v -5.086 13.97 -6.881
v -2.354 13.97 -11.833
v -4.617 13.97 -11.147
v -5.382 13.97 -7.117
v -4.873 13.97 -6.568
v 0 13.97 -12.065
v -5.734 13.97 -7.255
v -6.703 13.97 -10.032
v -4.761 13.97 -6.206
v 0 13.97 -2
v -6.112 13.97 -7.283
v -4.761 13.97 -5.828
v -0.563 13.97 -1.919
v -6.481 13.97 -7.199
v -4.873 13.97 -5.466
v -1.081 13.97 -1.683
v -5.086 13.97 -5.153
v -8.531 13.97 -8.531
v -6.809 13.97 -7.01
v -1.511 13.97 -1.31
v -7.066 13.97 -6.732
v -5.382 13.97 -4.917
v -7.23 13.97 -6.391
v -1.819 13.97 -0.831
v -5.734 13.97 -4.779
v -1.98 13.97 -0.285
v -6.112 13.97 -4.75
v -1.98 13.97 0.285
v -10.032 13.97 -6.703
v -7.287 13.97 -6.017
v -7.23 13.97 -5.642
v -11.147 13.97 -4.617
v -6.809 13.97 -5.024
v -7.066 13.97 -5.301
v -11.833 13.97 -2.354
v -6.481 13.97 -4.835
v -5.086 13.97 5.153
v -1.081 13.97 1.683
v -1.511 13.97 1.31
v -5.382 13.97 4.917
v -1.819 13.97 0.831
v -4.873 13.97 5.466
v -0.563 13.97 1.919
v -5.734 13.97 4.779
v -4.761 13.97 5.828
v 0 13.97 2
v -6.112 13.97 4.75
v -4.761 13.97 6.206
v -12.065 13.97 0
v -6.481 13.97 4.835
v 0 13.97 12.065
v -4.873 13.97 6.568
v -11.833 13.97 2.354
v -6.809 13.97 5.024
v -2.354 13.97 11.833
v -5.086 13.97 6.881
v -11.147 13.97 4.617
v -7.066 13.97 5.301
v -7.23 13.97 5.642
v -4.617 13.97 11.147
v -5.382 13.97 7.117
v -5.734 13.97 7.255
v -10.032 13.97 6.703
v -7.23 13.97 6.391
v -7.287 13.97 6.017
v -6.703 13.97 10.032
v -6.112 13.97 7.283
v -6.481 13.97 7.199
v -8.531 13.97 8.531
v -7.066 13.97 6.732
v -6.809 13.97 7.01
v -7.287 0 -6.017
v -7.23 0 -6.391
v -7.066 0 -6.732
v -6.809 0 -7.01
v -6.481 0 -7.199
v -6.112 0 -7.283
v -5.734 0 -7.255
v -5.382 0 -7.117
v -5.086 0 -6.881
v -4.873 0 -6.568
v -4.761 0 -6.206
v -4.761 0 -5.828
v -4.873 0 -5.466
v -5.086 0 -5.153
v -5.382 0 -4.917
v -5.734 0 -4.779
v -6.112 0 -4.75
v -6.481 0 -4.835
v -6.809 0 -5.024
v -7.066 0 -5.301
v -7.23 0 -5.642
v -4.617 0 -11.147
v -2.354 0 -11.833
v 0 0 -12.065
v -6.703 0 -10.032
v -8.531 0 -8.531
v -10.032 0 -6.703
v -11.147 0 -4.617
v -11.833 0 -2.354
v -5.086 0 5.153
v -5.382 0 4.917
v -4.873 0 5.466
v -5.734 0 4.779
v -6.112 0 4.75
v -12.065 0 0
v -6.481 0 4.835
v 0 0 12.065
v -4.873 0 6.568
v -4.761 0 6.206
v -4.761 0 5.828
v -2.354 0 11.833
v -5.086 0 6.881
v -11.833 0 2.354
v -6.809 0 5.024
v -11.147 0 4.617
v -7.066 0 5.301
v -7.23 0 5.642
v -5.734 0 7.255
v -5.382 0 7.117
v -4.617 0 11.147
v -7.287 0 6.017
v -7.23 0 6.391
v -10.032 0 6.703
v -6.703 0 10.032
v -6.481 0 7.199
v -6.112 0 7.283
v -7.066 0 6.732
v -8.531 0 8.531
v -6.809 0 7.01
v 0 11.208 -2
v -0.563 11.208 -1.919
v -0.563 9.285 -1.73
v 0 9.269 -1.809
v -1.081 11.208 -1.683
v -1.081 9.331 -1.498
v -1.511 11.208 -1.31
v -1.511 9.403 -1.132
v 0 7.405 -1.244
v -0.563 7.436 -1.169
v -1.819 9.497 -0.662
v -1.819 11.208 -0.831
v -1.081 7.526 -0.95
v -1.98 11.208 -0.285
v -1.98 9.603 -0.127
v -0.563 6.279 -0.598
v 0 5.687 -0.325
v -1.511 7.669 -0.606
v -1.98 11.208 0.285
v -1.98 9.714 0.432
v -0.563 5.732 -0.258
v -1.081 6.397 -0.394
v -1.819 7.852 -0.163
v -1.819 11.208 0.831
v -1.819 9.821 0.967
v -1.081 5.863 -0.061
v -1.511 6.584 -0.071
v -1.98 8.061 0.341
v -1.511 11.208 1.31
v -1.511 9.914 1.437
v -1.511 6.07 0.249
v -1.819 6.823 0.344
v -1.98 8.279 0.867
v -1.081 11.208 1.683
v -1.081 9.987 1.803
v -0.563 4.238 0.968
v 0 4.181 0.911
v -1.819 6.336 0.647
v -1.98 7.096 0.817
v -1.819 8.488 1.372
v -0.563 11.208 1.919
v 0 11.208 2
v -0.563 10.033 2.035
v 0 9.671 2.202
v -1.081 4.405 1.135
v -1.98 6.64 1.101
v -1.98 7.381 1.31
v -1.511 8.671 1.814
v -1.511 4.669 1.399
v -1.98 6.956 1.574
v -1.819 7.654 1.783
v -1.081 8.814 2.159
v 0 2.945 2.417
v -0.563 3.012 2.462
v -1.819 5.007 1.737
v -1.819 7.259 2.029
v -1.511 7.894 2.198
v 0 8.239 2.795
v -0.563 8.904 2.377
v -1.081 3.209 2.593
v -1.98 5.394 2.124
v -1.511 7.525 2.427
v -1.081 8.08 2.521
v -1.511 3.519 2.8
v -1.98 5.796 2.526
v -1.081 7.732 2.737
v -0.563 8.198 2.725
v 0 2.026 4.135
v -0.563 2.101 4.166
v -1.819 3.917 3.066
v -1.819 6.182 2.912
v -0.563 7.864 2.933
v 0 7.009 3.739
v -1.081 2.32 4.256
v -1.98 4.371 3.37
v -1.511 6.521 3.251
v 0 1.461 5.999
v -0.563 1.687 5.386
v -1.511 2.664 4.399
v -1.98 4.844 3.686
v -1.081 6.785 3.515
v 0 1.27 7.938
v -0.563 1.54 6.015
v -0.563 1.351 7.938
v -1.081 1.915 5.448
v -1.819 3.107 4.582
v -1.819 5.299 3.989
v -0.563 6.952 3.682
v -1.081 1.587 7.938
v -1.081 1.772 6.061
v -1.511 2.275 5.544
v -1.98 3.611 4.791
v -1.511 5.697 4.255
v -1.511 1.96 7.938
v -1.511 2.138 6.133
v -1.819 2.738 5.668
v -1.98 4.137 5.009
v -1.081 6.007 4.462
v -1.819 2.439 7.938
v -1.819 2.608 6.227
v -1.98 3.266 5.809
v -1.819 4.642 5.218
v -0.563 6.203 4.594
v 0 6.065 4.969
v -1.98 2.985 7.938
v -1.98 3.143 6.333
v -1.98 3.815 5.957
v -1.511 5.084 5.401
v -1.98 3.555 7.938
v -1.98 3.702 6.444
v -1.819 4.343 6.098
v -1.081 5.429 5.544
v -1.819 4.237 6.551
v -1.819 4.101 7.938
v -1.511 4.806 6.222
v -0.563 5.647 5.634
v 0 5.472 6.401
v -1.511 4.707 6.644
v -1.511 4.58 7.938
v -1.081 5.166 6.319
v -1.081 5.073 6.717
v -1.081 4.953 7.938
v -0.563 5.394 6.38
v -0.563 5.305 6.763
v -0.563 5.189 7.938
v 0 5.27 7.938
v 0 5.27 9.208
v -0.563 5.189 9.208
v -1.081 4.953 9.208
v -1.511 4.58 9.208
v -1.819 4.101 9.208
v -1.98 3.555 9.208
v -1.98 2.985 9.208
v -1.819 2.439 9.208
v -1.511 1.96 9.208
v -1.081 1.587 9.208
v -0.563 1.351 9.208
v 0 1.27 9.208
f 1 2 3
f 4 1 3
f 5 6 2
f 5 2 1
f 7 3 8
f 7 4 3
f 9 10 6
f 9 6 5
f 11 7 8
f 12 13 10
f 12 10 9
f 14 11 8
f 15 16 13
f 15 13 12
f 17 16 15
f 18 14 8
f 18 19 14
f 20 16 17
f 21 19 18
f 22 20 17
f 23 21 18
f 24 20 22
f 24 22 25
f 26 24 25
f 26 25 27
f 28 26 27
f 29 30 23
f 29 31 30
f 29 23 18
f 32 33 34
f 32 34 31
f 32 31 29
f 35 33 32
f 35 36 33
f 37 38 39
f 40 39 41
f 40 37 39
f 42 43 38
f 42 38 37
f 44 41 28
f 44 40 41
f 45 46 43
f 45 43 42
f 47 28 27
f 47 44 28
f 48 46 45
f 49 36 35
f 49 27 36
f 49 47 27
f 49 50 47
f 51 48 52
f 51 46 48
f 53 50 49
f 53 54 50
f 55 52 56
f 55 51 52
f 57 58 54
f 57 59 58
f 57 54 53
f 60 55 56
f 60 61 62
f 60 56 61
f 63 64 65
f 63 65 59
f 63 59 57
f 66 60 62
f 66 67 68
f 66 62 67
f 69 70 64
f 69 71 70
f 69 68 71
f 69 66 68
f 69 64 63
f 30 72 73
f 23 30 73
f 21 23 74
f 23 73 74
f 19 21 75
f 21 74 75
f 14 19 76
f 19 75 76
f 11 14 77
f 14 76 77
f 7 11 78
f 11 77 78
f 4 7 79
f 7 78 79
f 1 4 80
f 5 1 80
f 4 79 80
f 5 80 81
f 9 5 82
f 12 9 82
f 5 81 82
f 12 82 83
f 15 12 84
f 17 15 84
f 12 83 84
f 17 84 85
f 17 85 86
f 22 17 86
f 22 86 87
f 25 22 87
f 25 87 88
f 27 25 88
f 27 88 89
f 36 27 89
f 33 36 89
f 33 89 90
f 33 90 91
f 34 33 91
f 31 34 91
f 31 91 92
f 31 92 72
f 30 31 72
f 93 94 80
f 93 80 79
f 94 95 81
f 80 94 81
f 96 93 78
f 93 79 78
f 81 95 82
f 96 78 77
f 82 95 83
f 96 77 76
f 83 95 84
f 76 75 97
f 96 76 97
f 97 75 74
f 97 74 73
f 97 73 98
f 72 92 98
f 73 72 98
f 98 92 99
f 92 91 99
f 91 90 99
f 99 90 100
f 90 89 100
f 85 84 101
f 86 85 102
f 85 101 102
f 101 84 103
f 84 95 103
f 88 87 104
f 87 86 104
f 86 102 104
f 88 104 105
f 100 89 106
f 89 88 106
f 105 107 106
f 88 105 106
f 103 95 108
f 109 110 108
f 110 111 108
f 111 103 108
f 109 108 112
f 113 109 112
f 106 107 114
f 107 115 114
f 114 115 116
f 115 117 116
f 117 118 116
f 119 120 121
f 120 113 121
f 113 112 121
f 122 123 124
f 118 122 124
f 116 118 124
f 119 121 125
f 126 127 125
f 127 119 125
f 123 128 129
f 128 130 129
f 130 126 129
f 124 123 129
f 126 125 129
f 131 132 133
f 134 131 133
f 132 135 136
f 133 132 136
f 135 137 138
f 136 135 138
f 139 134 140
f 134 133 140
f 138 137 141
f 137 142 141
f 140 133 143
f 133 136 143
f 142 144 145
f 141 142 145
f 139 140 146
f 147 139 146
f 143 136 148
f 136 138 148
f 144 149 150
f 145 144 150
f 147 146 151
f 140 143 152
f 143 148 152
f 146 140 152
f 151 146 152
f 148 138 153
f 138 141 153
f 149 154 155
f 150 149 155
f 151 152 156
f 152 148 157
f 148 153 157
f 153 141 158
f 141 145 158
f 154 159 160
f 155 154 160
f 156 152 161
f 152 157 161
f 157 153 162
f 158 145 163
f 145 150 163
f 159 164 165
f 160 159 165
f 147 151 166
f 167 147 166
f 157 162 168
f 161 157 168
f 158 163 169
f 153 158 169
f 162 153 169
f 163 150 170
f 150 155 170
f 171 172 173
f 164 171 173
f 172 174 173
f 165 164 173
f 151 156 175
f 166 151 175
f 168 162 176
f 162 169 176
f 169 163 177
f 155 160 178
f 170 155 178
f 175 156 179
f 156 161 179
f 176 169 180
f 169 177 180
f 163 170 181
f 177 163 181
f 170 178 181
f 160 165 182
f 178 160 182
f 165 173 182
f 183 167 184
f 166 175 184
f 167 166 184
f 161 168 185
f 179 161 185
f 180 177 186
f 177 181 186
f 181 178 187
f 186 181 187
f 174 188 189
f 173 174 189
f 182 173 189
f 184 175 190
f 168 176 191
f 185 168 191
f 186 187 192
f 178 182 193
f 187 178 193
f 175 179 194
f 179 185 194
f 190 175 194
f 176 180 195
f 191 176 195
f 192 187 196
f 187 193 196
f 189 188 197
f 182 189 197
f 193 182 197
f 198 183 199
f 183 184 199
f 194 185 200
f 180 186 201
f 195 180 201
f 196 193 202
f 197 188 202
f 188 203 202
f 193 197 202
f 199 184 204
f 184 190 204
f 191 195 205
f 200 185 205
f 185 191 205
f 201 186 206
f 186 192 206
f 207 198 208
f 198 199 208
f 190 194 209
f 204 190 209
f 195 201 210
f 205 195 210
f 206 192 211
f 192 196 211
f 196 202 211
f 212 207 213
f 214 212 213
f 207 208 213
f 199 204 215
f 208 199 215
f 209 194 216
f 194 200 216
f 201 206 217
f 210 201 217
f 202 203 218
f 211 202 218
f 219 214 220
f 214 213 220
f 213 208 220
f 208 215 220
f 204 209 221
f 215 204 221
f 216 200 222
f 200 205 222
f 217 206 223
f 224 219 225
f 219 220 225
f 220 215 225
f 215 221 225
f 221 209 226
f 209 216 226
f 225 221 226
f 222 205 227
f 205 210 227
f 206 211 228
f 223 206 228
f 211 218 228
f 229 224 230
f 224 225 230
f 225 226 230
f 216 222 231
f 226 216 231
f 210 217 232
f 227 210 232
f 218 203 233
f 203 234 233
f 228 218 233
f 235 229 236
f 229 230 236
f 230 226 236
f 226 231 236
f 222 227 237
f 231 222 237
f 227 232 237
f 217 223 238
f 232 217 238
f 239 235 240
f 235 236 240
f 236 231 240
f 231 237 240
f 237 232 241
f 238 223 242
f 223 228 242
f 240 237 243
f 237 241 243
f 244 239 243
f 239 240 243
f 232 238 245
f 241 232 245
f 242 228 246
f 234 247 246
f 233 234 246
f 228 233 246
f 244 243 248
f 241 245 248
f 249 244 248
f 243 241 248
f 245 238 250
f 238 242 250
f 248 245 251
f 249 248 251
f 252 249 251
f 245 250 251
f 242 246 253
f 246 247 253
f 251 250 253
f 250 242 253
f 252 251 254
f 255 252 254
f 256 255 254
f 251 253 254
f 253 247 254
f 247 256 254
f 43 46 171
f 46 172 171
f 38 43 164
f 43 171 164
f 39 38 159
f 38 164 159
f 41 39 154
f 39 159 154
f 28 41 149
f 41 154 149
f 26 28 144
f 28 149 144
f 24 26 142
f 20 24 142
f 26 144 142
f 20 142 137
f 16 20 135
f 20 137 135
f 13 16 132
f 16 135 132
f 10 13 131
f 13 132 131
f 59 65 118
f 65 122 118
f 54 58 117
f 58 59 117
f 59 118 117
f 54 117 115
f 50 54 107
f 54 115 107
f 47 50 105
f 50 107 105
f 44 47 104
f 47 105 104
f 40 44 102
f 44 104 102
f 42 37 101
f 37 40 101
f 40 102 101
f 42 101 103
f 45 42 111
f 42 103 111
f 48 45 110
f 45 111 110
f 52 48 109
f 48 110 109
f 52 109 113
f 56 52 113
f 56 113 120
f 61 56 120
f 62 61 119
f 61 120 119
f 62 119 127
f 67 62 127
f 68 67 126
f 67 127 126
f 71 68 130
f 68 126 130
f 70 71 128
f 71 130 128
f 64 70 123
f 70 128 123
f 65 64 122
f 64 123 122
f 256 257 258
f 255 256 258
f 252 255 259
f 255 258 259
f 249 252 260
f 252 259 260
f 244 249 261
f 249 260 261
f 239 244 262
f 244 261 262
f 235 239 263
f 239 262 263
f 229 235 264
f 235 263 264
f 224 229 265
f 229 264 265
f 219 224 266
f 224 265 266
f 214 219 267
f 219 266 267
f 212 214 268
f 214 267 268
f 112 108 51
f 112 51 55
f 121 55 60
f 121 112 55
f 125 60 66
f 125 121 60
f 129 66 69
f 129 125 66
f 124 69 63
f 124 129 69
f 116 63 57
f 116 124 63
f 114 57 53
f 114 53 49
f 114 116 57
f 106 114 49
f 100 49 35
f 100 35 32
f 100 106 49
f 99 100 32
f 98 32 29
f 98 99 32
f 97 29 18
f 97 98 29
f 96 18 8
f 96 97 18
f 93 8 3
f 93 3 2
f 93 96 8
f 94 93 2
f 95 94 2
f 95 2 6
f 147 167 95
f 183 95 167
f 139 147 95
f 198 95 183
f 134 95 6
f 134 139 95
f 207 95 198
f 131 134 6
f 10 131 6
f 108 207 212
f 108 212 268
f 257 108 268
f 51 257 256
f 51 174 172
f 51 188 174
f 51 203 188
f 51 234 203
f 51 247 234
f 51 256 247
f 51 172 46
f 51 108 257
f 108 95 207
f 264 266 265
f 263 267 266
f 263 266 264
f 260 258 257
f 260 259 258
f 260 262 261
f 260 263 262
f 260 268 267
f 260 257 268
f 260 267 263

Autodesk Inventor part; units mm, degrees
ref_plane "YZ Plane" through (0, 0, 0) normal (1, 0, 0) x (0, 1, 0)
ref_plane "XZ Plane" through (0, 0, 0) normal (0, 1, 0) x (-1, 0, 0)
ref_plane "XY Plane" through (0, 0, 0) normal (0, 0, 1) x (1, 0, 0)
sketch "Sketch1" plane through (0, 0, 0) normal (0, 1, 0) x (-1, 0, 0)
  circle A0 centre (0, 0) radius 12.065
  line L0 (0, 0) -> (6.0168, -6.0168)
  line L1 (0, 0) -> (8.509, 0) construction
  circle A1 centre (6.0168, -6.0168) radius 1.27
  circle A2 centre (6.0168, 6.0168) radius 1.27
  circle A3 centre (-6.0168, 6.0168) radius 1.27
  circle A4 centre (-6.0168, -6.0168) radius 1.27
  dimension "d0" = 24.13
  dimension "d1" = 45
  dimension "d2" = 8.509
  dimension "d3" = 2.54
  dimension "d6" = 360
extrude "Extrusion1" add sketch "Sketch1" along normal blind 13.97
sketch "Sketch2" plane through (0, 0, 0) normal (1, 0, 0) x (0, 1, 0)
  line L0 (13.97, -12.065) -> (13.97, 12.065) projected
  line L1 (13.97, 0) -> (11.2075, 0)
  line L2 (11.2075, 0) -> (3.27, 0)
  line L3 (3.27, 0) -> (3.27, 7.9375)
  line L4 (3.27, 7.9375) -> (3.27, 9.2075)
  line L5 (0, 12.065) -> (0, -12.065) projected
  arc A0 (3.27, 7.9375) -> (11.2075, 0) centre (11.2075, 7.9375) ccw
  point P0 (0, 0)
  dimension "d15" = 7.9375
  dimension "d16" = 7.9375
  dimension "d17" = 1.27
  dimension "d18" = 3.27
sketch "Sketch3" plane through (0, 13.97, 0) normal (0, 1, 0) x (1, 0, 0)
  circle A0 centre (0, 0) radius 2
  dimension "d14" = 4
sweep "Sweep1" cut profiles "Sketch3" path "Sketch2" path curves L1 A0 L4
sketch "Sketch4" plane through (0, 0, 0) normal (1, 0, 0) x (0, 1, 0)
  line L0 (21.6749, -17.4359) -> (-6.3985, -17.4359)
  line L1 (-6.3985, -17.4359) -> (-6.3985, 17.036)
  line L2 (-6.3985, 17.036) -> (21.6749, 17.036)
  line L3 (21.6749, 17.036) -> (21.6749, -17.4359)
  point P0 (0, 0)
extrude "Extrusion2" cut sketch "Sketch4" along normal through all
properties part number "Side1Attachment" material "ABS Plastic"
